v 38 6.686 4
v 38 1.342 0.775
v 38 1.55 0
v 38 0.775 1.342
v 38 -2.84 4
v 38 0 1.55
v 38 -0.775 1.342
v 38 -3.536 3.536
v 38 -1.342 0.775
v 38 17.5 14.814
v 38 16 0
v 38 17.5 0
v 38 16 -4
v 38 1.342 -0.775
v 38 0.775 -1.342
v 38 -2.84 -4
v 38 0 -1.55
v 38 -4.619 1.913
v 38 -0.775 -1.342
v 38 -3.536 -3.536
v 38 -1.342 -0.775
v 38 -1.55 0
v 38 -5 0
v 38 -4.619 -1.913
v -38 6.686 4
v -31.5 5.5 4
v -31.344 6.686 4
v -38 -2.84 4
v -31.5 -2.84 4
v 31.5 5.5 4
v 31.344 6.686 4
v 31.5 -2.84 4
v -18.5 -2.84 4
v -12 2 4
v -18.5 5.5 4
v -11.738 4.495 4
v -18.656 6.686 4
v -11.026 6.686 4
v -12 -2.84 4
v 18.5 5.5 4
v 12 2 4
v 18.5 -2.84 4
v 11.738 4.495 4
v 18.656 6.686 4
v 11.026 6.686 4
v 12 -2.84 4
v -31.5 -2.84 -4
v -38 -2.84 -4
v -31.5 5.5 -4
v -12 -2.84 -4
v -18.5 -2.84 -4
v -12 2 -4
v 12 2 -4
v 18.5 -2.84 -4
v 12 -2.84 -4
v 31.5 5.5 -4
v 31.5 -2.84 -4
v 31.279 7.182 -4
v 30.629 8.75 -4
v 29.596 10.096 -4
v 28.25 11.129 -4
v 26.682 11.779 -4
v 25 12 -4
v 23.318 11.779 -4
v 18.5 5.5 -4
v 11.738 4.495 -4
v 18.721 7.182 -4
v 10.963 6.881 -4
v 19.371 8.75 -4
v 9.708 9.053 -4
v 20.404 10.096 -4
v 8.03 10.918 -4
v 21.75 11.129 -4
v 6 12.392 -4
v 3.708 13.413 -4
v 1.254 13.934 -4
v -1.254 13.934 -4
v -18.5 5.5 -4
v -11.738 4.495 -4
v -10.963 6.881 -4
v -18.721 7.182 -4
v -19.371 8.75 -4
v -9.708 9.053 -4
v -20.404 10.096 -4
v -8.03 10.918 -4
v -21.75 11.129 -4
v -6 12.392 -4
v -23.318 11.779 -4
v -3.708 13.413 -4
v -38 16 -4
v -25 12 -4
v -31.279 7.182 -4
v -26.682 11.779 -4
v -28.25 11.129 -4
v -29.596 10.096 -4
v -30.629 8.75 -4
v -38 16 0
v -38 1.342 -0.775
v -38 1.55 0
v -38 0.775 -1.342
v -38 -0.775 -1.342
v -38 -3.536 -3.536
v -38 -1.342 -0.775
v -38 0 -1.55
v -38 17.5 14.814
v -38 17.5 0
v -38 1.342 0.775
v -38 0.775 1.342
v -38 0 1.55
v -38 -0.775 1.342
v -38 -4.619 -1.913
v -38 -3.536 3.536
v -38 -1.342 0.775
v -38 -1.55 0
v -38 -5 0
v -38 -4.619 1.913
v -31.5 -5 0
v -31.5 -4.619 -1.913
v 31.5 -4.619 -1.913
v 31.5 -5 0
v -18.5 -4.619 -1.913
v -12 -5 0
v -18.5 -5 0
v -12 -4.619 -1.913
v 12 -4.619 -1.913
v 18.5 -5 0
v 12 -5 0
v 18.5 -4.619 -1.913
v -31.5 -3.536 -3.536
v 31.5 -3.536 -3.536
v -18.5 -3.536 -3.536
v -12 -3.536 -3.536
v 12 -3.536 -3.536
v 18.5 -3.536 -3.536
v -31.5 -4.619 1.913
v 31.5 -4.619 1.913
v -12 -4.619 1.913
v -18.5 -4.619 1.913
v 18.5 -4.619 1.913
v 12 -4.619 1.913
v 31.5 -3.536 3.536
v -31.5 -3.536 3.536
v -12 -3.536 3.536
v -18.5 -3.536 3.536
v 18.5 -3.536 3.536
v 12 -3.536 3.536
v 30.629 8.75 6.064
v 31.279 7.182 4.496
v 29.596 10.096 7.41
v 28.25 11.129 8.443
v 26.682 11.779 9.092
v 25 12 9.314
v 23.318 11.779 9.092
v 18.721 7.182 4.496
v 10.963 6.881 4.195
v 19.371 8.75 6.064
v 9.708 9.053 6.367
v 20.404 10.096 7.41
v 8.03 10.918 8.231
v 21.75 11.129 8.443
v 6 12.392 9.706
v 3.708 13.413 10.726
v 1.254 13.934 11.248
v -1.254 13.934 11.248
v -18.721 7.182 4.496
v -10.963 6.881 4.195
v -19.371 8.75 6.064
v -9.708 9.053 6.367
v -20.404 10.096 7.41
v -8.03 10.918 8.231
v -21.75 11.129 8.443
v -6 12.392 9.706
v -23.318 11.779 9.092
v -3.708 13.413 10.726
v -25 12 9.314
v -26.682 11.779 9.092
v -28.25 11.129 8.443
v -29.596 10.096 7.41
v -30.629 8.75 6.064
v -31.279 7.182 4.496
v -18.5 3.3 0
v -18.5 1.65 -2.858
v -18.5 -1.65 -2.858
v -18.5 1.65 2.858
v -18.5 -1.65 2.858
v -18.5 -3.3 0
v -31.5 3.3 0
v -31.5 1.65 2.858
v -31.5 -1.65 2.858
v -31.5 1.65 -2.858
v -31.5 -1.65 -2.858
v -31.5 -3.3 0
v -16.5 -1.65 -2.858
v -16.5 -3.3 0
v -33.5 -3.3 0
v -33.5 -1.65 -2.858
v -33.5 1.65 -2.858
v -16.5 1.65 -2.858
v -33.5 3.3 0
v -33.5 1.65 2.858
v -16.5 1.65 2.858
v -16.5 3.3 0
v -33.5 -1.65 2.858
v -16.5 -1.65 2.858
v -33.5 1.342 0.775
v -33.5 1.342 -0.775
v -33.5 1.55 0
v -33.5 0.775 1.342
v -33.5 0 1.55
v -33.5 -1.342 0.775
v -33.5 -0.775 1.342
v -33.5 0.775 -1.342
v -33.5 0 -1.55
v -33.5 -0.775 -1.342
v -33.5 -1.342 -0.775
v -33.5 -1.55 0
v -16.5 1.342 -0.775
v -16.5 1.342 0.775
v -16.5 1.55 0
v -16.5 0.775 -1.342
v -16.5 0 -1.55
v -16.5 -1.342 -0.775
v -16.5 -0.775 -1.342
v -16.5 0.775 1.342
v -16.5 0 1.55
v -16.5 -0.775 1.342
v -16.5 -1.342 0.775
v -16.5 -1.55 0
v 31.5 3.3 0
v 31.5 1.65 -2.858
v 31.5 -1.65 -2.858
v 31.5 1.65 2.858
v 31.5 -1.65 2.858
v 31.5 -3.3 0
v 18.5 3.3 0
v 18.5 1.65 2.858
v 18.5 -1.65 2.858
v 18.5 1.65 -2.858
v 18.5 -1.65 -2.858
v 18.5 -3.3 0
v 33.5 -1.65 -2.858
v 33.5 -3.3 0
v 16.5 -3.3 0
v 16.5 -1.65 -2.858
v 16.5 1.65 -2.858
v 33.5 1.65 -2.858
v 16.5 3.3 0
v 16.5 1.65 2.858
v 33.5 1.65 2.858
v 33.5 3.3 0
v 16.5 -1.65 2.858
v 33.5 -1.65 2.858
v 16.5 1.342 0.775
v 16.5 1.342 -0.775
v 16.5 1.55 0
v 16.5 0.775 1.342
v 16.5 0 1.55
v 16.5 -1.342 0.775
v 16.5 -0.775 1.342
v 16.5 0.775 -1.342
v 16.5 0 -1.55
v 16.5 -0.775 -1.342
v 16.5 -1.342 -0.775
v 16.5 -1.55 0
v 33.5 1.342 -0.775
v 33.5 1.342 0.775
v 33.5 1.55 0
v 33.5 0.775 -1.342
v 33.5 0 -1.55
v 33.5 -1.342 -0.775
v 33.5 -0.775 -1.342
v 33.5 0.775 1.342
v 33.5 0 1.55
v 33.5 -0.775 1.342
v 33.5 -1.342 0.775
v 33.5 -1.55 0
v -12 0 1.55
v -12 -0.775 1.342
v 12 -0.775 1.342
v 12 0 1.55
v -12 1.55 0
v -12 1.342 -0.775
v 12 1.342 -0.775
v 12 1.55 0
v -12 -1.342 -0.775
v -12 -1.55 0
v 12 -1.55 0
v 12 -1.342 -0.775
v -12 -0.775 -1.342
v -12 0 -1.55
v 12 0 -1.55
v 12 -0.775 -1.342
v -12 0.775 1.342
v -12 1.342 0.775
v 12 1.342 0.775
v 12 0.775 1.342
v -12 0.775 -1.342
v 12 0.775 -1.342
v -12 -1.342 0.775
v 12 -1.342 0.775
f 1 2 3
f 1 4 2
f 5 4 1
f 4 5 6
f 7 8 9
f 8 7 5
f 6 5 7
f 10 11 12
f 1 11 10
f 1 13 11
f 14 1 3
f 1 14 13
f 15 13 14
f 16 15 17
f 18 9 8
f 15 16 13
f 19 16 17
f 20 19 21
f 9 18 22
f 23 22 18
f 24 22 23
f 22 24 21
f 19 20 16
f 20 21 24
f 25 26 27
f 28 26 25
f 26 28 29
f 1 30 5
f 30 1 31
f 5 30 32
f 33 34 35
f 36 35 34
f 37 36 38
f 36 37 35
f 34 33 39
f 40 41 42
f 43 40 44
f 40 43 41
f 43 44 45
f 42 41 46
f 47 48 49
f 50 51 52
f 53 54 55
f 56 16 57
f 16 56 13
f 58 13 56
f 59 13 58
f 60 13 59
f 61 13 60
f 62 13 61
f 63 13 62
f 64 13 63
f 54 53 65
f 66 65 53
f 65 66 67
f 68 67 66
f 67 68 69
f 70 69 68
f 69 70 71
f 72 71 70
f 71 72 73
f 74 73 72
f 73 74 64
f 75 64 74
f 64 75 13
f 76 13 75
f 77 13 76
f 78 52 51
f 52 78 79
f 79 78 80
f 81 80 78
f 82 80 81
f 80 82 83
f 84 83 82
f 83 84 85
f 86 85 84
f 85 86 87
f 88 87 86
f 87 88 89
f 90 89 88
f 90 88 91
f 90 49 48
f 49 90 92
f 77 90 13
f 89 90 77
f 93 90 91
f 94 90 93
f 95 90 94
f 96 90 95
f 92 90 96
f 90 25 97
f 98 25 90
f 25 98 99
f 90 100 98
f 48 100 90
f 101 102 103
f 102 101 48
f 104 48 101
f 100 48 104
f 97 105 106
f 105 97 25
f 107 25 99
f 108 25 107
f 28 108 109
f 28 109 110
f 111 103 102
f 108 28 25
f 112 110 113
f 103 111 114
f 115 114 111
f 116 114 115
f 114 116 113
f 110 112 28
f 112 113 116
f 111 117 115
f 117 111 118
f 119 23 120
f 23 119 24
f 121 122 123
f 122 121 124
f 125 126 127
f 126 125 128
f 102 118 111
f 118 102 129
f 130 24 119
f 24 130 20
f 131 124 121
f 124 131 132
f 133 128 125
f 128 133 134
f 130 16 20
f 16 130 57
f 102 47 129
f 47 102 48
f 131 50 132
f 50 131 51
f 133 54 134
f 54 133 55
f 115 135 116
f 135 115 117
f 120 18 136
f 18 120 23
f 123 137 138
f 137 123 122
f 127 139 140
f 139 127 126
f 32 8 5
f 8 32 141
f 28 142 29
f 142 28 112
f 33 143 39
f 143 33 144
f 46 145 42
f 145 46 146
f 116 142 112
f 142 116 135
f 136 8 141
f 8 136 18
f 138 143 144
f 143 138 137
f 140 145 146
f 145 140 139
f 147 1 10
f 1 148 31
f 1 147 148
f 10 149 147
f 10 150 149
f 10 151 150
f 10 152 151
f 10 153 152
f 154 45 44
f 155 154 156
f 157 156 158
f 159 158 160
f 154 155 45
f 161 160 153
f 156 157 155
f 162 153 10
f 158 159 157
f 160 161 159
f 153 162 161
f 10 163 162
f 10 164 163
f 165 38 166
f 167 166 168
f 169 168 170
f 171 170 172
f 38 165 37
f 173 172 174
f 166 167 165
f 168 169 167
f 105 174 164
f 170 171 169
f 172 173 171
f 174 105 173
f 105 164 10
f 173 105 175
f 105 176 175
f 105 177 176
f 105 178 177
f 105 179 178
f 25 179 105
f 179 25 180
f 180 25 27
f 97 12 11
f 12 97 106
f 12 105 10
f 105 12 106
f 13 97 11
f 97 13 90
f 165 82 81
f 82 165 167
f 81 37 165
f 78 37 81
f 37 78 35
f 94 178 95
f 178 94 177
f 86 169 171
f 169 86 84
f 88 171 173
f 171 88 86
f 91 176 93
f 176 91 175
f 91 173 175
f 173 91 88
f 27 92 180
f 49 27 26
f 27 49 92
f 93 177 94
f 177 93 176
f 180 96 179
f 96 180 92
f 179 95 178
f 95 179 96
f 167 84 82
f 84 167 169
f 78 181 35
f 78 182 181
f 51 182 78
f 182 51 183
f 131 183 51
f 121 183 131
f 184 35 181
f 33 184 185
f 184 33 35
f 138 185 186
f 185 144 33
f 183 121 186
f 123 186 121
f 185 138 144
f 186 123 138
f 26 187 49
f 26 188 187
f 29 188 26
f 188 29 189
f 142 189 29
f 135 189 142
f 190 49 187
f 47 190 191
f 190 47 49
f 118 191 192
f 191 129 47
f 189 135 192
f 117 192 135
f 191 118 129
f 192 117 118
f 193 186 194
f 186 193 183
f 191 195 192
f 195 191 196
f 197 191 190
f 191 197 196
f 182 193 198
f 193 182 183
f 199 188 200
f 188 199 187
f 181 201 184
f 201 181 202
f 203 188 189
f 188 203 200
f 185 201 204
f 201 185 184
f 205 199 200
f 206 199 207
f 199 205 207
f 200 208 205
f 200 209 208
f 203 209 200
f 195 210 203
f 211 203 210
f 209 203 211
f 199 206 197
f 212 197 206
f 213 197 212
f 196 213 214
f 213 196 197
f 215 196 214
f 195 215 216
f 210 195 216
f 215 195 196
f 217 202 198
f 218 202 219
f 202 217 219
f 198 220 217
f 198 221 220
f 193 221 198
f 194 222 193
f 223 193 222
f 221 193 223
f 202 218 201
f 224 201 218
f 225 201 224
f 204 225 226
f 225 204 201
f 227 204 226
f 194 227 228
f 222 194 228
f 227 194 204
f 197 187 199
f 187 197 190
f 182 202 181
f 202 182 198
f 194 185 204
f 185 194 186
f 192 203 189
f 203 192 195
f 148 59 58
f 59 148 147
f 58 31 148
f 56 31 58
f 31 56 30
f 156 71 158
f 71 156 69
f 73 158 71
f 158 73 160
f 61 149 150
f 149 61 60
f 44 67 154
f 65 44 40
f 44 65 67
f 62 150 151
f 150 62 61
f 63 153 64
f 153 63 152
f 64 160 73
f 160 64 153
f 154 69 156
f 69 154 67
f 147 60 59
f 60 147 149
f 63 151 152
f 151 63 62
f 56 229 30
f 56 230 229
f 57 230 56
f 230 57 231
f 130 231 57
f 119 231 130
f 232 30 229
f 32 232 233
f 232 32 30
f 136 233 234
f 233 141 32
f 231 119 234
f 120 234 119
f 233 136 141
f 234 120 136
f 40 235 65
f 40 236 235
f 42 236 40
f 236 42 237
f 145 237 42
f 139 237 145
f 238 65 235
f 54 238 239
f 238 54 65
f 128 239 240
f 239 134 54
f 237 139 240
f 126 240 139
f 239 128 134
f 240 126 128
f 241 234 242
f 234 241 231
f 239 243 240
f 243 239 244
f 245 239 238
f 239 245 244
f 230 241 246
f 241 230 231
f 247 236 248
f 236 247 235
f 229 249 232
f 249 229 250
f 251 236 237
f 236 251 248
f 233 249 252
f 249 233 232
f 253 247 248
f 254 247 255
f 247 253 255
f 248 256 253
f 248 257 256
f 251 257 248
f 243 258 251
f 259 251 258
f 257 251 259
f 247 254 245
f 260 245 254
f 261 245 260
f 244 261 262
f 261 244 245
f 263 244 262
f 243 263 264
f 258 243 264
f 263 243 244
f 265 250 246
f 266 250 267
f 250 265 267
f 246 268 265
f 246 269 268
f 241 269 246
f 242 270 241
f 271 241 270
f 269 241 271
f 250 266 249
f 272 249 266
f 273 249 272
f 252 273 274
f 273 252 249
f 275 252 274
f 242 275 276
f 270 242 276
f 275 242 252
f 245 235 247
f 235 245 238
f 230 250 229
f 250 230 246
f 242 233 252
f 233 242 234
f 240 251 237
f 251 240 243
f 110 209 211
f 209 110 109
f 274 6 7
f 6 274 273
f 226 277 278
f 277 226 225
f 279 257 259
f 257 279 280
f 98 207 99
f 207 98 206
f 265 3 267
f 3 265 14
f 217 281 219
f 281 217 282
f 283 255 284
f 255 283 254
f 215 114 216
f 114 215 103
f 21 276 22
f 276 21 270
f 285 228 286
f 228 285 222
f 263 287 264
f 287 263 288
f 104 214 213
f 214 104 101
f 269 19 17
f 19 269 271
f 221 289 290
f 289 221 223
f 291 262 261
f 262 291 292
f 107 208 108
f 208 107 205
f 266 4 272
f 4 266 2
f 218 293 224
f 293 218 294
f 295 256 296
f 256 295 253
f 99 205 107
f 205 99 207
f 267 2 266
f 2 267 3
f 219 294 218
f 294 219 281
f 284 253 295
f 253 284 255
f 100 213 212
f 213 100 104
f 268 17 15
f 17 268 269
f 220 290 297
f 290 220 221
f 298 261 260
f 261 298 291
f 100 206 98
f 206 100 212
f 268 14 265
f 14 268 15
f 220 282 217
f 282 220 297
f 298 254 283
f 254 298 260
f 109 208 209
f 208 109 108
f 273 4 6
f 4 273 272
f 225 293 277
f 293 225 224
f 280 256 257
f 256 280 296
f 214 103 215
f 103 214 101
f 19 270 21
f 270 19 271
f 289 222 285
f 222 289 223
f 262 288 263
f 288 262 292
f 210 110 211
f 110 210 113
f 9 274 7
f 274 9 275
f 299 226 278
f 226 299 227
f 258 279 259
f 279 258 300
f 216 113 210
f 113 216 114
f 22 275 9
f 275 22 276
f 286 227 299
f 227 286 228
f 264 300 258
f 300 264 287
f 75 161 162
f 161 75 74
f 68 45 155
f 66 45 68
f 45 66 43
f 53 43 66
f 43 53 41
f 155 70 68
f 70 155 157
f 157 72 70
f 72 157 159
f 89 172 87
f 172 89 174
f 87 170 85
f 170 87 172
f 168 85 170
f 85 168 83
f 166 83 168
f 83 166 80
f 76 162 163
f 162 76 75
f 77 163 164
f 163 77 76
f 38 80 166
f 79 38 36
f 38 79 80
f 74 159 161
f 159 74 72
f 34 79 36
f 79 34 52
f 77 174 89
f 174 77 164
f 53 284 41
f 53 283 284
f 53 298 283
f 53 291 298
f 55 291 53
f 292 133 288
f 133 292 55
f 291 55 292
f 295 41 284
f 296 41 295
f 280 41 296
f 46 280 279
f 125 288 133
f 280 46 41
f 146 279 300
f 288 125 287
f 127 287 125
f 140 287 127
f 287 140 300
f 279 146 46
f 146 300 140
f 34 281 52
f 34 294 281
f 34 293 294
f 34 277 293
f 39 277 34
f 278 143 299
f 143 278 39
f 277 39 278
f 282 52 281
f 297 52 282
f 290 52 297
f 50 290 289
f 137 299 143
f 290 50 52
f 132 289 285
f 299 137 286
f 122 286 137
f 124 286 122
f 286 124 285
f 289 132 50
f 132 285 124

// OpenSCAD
width = 76;
height = 24;

offset = 25;
cutout = 13;
middle = 2*offset - width/2;

module parallel_joints(reinforced) {
  difference() {
    union() {
      intersection() {
        cube([width, 20, 8], center=true);
        rotate([0, 90, 0]) cylinder(r=5, h=width, center=true);
      }
      intersection() {
        translate([0, 18, 4]) rotate([45, 0, 0])
          cube([width, reinforced, reinforced], center=true);
        translate([0, 0, 20]) cube([width, 35, 40], center=true);
      }
      translate([0, 8, 0]) cube([width, 16, 8], center=true);
    }
    
    rotate([0, 90, 0]) cylinder(r=1.55, h=80, center=true, $fn=12);

    for (x = [-offset, offset]) {
      translate([x, 5.5, 0])
        cylinder(r=cutout/2, h=100, center=true, $fn=24);
      translate([x, -4.5, 0])
        cube([cutout, 20, 100], center=true);
      translate([x, 0, 0]) rotate([0, 90, 0]) rotate([0, 0, 30])
        cylinder(r=3.3, h=17, center=true, $fn=6);
    }
    
    translate([0, 2, 0]) cylinder(r=middle, h=100, center=true);
    translate([0, -8, 0]) cube([2*middle, 20, 100], center=true);
  }
}

module carriage() {
    
    union() {
        translate([0, 0, 0])parallel_joints(16);
    }
      
}

carriage();

// Uncomment the following lines to check endstop alignment.
// use <idler_end.scad>;
// translate([0, 0, -20]) rotate([180, 0, 0]) idler_end();
